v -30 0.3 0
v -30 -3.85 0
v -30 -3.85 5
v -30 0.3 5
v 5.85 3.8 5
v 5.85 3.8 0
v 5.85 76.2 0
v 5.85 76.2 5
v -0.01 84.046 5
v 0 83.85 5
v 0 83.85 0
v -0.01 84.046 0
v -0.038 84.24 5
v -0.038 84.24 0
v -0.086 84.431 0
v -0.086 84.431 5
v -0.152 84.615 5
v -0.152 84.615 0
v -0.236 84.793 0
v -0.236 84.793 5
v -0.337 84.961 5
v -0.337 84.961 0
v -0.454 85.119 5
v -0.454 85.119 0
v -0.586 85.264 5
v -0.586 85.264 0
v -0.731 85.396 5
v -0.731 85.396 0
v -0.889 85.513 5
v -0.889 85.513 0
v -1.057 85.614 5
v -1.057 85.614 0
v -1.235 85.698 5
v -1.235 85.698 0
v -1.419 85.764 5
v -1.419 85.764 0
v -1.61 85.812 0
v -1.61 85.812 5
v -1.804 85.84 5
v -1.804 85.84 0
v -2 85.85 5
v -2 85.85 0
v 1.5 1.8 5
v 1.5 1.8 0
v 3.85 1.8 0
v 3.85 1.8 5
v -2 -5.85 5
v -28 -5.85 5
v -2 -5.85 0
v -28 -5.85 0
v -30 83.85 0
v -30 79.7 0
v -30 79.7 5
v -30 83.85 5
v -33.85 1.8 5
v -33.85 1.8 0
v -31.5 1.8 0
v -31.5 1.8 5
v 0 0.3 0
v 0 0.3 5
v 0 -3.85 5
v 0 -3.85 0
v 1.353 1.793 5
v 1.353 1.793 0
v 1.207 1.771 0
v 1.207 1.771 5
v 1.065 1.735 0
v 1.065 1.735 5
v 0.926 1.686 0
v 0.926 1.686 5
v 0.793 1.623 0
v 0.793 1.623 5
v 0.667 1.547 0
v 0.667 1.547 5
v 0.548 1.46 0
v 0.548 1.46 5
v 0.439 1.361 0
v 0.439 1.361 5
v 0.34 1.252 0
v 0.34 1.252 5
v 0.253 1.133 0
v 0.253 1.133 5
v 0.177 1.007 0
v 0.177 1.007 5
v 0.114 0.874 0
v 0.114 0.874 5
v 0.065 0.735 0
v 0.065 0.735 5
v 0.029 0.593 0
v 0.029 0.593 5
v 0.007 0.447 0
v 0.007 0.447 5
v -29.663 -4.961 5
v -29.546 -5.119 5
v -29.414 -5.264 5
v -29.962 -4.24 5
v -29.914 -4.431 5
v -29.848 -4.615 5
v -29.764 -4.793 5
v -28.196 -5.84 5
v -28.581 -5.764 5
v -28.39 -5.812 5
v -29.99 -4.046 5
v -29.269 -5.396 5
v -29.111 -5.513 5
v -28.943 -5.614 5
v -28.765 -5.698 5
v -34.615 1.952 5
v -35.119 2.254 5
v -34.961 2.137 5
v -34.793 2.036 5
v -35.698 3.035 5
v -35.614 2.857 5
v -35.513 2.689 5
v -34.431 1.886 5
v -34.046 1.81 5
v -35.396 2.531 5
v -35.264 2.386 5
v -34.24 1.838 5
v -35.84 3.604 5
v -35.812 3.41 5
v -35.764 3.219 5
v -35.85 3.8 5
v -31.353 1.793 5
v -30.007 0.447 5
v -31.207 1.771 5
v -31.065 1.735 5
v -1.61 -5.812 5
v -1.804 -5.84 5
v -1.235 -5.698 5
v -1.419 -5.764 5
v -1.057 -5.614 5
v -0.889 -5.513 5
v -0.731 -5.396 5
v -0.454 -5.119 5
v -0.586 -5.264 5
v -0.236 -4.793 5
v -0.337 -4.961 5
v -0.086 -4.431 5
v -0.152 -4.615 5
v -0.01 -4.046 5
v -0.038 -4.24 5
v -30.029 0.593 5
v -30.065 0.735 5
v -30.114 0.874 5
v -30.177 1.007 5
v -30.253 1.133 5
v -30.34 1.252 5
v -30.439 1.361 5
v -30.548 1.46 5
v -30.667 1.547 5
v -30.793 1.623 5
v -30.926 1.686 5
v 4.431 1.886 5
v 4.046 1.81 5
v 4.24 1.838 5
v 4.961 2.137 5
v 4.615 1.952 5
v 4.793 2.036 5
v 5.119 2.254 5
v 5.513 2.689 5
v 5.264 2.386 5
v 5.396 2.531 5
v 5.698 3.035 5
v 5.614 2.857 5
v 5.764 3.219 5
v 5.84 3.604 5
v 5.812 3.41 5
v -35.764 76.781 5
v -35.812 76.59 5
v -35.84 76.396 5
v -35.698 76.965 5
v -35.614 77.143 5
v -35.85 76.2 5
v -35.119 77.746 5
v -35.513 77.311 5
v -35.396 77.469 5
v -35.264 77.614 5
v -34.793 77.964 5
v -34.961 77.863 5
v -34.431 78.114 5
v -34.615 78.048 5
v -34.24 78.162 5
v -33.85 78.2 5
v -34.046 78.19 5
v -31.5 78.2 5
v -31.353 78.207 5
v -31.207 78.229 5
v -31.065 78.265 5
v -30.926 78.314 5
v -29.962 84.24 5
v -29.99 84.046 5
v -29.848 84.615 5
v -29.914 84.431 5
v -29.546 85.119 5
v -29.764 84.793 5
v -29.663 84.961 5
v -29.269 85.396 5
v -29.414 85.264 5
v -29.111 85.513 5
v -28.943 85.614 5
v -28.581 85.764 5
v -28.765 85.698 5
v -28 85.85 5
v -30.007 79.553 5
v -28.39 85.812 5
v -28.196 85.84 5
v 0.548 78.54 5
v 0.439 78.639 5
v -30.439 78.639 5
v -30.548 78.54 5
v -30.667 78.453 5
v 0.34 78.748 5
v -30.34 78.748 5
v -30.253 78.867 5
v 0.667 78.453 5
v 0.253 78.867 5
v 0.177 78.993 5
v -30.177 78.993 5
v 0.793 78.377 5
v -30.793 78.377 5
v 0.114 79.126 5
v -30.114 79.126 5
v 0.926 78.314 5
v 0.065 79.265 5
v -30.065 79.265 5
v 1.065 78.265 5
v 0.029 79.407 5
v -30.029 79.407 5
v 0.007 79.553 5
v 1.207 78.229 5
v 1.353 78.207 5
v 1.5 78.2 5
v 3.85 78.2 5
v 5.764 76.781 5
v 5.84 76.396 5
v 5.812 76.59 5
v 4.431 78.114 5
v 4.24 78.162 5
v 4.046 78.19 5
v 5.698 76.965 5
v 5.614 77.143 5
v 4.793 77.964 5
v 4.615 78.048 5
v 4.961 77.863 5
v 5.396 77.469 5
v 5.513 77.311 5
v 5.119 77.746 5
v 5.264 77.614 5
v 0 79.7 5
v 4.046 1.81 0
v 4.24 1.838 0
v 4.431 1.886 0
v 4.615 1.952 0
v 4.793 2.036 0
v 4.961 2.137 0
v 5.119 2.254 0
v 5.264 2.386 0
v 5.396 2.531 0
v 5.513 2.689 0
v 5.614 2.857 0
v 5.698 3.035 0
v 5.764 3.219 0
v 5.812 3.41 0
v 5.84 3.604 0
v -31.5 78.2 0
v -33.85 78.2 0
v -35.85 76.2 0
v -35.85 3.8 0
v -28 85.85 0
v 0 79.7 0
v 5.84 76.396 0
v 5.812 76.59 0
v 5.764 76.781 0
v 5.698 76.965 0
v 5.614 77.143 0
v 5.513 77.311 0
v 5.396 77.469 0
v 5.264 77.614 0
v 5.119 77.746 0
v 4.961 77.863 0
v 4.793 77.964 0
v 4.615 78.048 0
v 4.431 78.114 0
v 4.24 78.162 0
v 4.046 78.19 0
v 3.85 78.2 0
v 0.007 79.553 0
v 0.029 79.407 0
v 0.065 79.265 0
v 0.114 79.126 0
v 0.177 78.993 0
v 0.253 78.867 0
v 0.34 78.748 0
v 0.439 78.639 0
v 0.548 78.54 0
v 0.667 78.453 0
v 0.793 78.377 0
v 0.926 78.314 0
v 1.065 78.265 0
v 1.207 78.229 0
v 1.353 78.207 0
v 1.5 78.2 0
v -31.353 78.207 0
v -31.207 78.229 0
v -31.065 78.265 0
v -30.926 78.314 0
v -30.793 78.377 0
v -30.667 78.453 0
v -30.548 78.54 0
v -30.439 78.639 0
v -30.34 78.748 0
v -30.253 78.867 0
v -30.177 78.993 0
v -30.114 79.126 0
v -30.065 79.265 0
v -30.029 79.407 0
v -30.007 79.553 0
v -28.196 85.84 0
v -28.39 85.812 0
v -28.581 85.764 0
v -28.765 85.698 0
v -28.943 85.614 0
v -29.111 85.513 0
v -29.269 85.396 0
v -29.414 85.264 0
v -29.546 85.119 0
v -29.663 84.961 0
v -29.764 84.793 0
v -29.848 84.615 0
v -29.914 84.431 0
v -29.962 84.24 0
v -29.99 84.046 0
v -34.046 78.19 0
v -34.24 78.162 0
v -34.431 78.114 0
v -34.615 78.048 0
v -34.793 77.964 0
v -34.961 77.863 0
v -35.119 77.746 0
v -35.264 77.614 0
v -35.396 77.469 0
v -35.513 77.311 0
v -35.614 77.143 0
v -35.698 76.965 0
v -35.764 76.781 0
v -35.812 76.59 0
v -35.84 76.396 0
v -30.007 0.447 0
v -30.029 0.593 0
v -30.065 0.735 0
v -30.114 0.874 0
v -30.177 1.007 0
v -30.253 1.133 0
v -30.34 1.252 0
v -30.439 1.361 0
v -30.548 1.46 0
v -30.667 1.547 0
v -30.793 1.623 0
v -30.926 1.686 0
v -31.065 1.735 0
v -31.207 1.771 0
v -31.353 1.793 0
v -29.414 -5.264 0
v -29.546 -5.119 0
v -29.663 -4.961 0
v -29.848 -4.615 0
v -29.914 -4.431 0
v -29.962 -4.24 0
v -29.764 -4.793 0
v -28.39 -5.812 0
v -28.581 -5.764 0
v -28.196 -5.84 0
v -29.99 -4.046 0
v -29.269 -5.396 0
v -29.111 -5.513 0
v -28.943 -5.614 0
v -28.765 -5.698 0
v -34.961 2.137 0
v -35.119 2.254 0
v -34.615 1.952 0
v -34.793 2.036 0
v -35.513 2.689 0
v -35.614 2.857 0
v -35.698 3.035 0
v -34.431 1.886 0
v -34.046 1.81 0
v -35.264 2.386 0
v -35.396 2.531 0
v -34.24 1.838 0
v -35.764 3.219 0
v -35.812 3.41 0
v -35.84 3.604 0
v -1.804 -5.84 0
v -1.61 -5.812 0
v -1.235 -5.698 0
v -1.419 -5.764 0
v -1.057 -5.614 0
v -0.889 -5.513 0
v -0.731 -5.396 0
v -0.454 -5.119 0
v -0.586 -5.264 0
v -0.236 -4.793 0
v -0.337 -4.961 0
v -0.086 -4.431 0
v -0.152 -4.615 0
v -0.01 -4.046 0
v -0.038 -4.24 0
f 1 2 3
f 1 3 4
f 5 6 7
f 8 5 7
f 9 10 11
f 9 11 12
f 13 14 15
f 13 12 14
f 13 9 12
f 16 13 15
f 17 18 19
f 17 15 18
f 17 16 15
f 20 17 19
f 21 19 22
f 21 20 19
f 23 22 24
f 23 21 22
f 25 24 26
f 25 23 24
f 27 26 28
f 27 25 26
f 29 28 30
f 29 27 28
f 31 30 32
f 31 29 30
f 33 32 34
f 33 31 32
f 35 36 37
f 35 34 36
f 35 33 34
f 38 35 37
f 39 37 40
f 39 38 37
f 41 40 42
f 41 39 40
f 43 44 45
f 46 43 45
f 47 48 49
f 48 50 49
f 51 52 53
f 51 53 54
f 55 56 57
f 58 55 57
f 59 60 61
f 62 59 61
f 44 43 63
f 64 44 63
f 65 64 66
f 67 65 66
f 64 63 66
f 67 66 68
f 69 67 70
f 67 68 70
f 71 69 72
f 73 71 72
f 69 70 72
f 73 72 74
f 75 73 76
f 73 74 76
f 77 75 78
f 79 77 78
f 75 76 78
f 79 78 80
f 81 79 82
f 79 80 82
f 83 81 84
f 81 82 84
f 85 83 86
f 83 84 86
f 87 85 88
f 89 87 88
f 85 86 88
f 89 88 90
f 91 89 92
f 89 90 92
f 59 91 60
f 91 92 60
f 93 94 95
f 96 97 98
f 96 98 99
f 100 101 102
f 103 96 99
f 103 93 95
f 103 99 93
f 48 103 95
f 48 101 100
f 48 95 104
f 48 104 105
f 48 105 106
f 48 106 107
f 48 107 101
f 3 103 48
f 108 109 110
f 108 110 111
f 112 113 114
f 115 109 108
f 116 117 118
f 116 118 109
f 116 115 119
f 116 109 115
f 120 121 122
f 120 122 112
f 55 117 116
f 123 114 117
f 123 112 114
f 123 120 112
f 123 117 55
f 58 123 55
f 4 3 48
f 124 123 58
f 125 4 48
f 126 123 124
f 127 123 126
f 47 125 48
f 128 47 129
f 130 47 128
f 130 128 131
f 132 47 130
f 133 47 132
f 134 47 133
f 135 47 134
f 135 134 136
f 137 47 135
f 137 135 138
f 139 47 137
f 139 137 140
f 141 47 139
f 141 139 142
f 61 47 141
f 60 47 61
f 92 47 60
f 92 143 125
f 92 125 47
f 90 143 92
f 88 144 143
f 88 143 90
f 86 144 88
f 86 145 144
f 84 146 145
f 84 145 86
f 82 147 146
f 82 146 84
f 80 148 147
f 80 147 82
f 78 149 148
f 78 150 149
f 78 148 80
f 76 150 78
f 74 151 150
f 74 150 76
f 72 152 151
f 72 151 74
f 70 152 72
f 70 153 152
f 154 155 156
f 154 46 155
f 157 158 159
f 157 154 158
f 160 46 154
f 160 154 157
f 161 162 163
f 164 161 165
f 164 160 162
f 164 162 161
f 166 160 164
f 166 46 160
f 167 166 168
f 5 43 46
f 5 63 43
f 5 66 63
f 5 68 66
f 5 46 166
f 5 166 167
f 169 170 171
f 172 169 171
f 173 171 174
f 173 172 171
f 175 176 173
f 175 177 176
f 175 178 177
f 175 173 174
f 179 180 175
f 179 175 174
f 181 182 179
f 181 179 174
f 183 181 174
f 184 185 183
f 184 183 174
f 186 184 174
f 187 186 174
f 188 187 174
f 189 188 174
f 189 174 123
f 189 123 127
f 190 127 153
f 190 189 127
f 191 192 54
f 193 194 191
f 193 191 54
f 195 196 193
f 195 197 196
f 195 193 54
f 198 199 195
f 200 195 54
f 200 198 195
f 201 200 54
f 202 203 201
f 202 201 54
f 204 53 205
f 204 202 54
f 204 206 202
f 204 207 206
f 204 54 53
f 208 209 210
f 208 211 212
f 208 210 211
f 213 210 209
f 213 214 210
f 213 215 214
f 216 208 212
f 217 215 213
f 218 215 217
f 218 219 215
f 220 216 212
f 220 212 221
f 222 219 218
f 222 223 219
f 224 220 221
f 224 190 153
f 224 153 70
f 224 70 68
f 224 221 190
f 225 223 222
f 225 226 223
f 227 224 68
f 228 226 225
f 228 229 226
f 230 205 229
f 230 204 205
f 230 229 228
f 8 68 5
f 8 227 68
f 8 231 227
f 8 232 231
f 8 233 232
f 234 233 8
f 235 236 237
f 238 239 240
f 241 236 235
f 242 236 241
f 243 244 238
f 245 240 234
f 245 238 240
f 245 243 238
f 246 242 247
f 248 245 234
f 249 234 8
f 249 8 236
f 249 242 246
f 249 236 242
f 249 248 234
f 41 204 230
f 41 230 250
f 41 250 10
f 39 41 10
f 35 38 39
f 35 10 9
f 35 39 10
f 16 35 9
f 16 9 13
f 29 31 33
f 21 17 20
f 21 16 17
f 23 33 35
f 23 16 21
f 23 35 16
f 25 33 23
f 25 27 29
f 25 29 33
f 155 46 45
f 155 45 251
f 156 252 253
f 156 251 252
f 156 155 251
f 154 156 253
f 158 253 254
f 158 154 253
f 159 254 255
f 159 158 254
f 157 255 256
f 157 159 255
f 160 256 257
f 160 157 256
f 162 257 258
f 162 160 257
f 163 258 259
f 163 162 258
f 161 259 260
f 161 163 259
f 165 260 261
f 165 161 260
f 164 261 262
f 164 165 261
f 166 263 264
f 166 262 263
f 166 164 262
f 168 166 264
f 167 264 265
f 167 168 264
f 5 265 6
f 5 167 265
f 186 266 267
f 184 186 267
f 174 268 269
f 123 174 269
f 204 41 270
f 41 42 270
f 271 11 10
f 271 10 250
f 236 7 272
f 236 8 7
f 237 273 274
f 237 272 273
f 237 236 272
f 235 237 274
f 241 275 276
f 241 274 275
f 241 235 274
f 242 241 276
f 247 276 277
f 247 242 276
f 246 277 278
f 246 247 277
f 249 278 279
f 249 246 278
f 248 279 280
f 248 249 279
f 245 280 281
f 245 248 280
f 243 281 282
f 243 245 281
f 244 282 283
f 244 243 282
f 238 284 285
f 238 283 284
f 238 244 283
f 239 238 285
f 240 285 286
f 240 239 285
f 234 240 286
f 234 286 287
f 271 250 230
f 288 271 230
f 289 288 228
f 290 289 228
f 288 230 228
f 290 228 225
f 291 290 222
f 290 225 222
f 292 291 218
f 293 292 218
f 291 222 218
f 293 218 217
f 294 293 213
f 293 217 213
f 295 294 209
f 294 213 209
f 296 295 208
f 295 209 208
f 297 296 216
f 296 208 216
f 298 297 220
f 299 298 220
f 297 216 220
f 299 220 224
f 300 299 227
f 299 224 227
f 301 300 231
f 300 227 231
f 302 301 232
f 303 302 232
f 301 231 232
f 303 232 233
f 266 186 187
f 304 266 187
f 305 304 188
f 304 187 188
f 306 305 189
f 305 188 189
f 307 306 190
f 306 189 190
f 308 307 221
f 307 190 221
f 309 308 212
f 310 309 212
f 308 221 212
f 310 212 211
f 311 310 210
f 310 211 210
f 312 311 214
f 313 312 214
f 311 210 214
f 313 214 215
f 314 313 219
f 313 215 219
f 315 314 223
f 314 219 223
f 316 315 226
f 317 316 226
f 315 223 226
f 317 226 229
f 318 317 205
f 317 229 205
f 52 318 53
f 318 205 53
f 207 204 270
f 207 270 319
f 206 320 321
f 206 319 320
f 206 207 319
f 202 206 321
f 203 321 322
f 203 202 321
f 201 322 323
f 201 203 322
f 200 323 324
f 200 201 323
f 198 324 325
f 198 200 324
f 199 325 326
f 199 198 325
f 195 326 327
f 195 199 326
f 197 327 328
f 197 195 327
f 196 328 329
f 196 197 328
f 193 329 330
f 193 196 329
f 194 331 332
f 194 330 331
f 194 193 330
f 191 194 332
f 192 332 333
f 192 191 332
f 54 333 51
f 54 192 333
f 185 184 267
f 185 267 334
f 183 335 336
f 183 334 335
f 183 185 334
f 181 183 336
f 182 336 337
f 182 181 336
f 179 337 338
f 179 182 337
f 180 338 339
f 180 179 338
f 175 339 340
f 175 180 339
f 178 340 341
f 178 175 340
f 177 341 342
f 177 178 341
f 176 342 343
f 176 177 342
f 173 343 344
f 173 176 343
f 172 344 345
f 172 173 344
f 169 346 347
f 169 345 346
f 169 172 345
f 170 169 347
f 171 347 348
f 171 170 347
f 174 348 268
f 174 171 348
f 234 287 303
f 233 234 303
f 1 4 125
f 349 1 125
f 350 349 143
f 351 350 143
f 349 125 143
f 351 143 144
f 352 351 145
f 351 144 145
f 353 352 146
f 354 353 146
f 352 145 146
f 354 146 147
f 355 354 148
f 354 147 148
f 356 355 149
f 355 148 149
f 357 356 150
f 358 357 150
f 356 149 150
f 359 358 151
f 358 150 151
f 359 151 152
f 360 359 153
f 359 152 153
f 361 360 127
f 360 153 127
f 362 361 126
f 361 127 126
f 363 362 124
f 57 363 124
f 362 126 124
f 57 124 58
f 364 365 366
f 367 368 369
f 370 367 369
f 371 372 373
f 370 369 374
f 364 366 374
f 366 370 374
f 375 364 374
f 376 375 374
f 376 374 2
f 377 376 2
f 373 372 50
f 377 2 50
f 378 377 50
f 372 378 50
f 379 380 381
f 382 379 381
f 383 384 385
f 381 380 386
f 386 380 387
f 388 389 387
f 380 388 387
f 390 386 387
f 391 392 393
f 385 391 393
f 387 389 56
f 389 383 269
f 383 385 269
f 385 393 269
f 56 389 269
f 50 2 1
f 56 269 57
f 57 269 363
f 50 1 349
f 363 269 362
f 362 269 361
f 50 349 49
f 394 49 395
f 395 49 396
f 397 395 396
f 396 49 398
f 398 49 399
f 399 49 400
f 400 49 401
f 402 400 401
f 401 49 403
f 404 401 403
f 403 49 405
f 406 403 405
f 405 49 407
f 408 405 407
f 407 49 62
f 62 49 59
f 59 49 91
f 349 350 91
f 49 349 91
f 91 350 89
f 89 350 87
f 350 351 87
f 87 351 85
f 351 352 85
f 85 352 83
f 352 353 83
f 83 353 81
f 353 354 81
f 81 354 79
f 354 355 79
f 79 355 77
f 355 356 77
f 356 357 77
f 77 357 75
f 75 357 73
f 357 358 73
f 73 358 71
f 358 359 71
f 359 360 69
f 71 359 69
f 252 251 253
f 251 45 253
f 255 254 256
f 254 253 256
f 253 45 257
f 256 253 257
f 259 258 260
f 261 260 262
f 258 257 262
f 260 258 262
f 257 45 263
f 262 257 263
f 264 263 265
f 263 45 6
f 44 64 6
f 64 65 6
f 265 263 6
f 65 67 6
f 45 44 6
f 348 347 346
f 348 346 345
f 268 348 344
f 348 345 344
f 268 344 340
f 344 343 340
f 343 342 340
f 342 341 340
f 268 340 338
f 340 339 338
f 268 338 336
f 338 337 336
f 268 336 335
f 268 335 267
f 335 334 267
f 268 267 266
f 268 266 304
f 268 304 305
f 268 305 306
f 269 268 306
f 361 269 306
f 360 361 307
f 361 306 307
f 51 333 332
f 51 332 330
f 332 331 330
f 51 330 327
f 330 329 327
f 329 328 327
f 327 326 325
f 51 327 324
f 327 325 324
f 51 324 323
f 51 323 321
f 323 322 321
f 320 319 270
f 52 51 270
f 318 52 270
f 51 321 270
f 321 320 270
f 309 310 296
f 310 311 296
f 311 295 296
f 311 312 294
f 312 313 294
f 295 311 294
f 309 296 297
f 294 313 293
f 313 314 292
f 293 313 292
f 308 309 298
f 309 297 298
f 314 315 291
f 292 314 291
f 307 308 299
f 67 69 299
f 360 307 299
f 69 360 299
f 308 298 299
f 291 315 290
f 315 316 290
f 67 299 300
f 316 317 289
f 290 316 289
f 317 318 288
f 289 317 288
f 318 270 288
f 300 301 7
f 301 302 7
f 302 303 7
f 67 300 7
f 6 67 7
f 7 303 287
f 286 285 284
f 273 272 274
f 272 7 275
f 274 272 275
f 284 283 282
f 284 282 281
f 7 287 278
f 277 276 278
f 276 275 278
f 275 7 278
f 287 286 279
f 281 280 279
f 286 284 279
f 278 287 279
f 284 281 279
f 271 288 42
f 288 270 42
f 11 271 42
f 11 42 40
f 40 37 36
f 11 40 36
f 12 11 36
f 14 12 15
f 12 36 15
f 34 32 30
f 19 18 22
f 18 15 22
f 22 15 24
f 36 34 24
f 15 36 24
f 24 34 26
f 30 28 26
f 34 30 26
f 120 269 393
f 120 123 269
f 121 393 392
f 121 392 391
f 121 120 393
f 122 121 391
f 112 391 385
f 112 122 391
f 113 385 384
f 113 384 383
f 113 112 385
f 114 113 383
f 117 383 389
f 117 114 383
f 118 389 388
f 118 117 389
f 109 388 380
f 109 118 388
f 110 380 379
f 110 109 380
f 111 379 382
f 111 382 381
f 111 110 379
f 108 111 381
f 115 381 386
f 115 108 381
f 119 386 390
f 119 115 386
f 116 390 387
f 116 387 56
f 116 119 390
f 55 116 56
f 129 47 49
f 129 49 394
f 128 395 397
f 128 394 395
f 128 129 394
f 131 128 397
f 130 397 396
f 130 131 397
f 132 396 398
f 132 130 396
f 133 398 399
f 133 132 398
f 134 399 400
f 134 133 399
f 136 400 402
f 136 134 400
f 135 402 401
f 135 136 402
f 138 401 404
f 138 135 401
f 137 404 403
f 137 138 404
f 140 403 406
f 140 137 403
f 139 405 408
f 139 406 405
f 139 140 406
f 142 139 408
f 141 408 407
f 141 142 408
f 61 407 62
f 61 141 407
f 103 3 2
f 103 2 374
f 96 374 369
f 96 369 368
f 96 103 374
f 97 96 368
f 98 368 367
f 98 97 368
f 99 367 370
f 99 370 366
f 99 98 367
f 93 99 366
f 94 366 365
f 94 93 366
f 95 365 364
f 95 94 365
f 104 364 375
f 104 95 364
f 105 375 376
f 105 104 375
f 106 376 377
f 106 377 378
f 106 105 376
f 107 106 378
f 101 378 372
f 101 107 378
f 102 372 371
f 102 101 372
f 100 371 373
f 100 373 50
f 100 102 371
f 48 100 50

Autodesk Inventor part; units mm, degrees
ref_plane "YZ Plane" through (0, 0, 0) normal (1, 0, 0) x (0, 1, 0)
ref_plane "XZ Plane" through (0, 0, 0) normal (0, 1, 0) x (-1, 0, 0)
ref_plane "XY Plane" through (0, 0, 0) normal (0, 0, 1) x (1, 0, 0)
sketch "Skizze3" plane through (0, 0, 0) normal (0, 0, 1) x (1, 0, 0)
  line L0 (0, 0) -> (-30, 0)
  line L1 (-30, 0) -> (-30, 80)
  line L2 (-30, 80) -> (0, 80)
  line L3 (0, 80) -> (0, 0)
  line L4 (-30, 78.2) -> (-35.85, 78.2)
  line L5 (-35.85, 78.2) -> (-35.85, 40)
  line L6 (-35.85, 40) -> (-30, 40)
  line L7 (-30, 40) -> (-30, 78.2)
  line L8 (-30, 80) -> (-15, 80)
  line L9 (-15, 80) -> (-15, 85.85)
  line L10 (-15, 85.85) -> (-30, 85.85)
  line L11 (-30, 85.85) -> (-30, 80)
  point P0 (-30, 40)
  point P1 (-15, 80)
  dimension "d4" = 80
  dimension "d5" = 30
  dimension "d6" = 5.85
  dimension "d7" = 5.85
  dimension "d8" = 1.8
extrude "Extrusion3" add sketch "Skizze3" along normal blind 5 contours L0 L1 L2 L3
extrude "Extrusion4" add sketch "Skizze3" along normal blind 5 contours L6 L5 L4 L1 | L2 L11 L10 L9
fillet "Rundung1" radius 2 2 edges at (-35.85, 78.2, 2.5) (-30, 85.85, 2.5)
mirror "Spiegeln1" about plane through (-15, 80, 0) normal (1, 0, 0) of "Extrusion4", "Rundung1"
mirror "Spiegeln2" about plane through (5.85, 40, 0) normal (0, -1, 0) of "Extrusion4", "Rundung1", "Spiegeln1"
fillet "Rundung2" radius 1.5 4 edges at (0, 78.2, 2.5) (-30, 78.2, 2.5) (-30, 1.8, 2.5) (0, 1.8, 2.5)
equation "\"d7\" = d6"
properties part number "BT705_trajan20_21" material "Acryl"
